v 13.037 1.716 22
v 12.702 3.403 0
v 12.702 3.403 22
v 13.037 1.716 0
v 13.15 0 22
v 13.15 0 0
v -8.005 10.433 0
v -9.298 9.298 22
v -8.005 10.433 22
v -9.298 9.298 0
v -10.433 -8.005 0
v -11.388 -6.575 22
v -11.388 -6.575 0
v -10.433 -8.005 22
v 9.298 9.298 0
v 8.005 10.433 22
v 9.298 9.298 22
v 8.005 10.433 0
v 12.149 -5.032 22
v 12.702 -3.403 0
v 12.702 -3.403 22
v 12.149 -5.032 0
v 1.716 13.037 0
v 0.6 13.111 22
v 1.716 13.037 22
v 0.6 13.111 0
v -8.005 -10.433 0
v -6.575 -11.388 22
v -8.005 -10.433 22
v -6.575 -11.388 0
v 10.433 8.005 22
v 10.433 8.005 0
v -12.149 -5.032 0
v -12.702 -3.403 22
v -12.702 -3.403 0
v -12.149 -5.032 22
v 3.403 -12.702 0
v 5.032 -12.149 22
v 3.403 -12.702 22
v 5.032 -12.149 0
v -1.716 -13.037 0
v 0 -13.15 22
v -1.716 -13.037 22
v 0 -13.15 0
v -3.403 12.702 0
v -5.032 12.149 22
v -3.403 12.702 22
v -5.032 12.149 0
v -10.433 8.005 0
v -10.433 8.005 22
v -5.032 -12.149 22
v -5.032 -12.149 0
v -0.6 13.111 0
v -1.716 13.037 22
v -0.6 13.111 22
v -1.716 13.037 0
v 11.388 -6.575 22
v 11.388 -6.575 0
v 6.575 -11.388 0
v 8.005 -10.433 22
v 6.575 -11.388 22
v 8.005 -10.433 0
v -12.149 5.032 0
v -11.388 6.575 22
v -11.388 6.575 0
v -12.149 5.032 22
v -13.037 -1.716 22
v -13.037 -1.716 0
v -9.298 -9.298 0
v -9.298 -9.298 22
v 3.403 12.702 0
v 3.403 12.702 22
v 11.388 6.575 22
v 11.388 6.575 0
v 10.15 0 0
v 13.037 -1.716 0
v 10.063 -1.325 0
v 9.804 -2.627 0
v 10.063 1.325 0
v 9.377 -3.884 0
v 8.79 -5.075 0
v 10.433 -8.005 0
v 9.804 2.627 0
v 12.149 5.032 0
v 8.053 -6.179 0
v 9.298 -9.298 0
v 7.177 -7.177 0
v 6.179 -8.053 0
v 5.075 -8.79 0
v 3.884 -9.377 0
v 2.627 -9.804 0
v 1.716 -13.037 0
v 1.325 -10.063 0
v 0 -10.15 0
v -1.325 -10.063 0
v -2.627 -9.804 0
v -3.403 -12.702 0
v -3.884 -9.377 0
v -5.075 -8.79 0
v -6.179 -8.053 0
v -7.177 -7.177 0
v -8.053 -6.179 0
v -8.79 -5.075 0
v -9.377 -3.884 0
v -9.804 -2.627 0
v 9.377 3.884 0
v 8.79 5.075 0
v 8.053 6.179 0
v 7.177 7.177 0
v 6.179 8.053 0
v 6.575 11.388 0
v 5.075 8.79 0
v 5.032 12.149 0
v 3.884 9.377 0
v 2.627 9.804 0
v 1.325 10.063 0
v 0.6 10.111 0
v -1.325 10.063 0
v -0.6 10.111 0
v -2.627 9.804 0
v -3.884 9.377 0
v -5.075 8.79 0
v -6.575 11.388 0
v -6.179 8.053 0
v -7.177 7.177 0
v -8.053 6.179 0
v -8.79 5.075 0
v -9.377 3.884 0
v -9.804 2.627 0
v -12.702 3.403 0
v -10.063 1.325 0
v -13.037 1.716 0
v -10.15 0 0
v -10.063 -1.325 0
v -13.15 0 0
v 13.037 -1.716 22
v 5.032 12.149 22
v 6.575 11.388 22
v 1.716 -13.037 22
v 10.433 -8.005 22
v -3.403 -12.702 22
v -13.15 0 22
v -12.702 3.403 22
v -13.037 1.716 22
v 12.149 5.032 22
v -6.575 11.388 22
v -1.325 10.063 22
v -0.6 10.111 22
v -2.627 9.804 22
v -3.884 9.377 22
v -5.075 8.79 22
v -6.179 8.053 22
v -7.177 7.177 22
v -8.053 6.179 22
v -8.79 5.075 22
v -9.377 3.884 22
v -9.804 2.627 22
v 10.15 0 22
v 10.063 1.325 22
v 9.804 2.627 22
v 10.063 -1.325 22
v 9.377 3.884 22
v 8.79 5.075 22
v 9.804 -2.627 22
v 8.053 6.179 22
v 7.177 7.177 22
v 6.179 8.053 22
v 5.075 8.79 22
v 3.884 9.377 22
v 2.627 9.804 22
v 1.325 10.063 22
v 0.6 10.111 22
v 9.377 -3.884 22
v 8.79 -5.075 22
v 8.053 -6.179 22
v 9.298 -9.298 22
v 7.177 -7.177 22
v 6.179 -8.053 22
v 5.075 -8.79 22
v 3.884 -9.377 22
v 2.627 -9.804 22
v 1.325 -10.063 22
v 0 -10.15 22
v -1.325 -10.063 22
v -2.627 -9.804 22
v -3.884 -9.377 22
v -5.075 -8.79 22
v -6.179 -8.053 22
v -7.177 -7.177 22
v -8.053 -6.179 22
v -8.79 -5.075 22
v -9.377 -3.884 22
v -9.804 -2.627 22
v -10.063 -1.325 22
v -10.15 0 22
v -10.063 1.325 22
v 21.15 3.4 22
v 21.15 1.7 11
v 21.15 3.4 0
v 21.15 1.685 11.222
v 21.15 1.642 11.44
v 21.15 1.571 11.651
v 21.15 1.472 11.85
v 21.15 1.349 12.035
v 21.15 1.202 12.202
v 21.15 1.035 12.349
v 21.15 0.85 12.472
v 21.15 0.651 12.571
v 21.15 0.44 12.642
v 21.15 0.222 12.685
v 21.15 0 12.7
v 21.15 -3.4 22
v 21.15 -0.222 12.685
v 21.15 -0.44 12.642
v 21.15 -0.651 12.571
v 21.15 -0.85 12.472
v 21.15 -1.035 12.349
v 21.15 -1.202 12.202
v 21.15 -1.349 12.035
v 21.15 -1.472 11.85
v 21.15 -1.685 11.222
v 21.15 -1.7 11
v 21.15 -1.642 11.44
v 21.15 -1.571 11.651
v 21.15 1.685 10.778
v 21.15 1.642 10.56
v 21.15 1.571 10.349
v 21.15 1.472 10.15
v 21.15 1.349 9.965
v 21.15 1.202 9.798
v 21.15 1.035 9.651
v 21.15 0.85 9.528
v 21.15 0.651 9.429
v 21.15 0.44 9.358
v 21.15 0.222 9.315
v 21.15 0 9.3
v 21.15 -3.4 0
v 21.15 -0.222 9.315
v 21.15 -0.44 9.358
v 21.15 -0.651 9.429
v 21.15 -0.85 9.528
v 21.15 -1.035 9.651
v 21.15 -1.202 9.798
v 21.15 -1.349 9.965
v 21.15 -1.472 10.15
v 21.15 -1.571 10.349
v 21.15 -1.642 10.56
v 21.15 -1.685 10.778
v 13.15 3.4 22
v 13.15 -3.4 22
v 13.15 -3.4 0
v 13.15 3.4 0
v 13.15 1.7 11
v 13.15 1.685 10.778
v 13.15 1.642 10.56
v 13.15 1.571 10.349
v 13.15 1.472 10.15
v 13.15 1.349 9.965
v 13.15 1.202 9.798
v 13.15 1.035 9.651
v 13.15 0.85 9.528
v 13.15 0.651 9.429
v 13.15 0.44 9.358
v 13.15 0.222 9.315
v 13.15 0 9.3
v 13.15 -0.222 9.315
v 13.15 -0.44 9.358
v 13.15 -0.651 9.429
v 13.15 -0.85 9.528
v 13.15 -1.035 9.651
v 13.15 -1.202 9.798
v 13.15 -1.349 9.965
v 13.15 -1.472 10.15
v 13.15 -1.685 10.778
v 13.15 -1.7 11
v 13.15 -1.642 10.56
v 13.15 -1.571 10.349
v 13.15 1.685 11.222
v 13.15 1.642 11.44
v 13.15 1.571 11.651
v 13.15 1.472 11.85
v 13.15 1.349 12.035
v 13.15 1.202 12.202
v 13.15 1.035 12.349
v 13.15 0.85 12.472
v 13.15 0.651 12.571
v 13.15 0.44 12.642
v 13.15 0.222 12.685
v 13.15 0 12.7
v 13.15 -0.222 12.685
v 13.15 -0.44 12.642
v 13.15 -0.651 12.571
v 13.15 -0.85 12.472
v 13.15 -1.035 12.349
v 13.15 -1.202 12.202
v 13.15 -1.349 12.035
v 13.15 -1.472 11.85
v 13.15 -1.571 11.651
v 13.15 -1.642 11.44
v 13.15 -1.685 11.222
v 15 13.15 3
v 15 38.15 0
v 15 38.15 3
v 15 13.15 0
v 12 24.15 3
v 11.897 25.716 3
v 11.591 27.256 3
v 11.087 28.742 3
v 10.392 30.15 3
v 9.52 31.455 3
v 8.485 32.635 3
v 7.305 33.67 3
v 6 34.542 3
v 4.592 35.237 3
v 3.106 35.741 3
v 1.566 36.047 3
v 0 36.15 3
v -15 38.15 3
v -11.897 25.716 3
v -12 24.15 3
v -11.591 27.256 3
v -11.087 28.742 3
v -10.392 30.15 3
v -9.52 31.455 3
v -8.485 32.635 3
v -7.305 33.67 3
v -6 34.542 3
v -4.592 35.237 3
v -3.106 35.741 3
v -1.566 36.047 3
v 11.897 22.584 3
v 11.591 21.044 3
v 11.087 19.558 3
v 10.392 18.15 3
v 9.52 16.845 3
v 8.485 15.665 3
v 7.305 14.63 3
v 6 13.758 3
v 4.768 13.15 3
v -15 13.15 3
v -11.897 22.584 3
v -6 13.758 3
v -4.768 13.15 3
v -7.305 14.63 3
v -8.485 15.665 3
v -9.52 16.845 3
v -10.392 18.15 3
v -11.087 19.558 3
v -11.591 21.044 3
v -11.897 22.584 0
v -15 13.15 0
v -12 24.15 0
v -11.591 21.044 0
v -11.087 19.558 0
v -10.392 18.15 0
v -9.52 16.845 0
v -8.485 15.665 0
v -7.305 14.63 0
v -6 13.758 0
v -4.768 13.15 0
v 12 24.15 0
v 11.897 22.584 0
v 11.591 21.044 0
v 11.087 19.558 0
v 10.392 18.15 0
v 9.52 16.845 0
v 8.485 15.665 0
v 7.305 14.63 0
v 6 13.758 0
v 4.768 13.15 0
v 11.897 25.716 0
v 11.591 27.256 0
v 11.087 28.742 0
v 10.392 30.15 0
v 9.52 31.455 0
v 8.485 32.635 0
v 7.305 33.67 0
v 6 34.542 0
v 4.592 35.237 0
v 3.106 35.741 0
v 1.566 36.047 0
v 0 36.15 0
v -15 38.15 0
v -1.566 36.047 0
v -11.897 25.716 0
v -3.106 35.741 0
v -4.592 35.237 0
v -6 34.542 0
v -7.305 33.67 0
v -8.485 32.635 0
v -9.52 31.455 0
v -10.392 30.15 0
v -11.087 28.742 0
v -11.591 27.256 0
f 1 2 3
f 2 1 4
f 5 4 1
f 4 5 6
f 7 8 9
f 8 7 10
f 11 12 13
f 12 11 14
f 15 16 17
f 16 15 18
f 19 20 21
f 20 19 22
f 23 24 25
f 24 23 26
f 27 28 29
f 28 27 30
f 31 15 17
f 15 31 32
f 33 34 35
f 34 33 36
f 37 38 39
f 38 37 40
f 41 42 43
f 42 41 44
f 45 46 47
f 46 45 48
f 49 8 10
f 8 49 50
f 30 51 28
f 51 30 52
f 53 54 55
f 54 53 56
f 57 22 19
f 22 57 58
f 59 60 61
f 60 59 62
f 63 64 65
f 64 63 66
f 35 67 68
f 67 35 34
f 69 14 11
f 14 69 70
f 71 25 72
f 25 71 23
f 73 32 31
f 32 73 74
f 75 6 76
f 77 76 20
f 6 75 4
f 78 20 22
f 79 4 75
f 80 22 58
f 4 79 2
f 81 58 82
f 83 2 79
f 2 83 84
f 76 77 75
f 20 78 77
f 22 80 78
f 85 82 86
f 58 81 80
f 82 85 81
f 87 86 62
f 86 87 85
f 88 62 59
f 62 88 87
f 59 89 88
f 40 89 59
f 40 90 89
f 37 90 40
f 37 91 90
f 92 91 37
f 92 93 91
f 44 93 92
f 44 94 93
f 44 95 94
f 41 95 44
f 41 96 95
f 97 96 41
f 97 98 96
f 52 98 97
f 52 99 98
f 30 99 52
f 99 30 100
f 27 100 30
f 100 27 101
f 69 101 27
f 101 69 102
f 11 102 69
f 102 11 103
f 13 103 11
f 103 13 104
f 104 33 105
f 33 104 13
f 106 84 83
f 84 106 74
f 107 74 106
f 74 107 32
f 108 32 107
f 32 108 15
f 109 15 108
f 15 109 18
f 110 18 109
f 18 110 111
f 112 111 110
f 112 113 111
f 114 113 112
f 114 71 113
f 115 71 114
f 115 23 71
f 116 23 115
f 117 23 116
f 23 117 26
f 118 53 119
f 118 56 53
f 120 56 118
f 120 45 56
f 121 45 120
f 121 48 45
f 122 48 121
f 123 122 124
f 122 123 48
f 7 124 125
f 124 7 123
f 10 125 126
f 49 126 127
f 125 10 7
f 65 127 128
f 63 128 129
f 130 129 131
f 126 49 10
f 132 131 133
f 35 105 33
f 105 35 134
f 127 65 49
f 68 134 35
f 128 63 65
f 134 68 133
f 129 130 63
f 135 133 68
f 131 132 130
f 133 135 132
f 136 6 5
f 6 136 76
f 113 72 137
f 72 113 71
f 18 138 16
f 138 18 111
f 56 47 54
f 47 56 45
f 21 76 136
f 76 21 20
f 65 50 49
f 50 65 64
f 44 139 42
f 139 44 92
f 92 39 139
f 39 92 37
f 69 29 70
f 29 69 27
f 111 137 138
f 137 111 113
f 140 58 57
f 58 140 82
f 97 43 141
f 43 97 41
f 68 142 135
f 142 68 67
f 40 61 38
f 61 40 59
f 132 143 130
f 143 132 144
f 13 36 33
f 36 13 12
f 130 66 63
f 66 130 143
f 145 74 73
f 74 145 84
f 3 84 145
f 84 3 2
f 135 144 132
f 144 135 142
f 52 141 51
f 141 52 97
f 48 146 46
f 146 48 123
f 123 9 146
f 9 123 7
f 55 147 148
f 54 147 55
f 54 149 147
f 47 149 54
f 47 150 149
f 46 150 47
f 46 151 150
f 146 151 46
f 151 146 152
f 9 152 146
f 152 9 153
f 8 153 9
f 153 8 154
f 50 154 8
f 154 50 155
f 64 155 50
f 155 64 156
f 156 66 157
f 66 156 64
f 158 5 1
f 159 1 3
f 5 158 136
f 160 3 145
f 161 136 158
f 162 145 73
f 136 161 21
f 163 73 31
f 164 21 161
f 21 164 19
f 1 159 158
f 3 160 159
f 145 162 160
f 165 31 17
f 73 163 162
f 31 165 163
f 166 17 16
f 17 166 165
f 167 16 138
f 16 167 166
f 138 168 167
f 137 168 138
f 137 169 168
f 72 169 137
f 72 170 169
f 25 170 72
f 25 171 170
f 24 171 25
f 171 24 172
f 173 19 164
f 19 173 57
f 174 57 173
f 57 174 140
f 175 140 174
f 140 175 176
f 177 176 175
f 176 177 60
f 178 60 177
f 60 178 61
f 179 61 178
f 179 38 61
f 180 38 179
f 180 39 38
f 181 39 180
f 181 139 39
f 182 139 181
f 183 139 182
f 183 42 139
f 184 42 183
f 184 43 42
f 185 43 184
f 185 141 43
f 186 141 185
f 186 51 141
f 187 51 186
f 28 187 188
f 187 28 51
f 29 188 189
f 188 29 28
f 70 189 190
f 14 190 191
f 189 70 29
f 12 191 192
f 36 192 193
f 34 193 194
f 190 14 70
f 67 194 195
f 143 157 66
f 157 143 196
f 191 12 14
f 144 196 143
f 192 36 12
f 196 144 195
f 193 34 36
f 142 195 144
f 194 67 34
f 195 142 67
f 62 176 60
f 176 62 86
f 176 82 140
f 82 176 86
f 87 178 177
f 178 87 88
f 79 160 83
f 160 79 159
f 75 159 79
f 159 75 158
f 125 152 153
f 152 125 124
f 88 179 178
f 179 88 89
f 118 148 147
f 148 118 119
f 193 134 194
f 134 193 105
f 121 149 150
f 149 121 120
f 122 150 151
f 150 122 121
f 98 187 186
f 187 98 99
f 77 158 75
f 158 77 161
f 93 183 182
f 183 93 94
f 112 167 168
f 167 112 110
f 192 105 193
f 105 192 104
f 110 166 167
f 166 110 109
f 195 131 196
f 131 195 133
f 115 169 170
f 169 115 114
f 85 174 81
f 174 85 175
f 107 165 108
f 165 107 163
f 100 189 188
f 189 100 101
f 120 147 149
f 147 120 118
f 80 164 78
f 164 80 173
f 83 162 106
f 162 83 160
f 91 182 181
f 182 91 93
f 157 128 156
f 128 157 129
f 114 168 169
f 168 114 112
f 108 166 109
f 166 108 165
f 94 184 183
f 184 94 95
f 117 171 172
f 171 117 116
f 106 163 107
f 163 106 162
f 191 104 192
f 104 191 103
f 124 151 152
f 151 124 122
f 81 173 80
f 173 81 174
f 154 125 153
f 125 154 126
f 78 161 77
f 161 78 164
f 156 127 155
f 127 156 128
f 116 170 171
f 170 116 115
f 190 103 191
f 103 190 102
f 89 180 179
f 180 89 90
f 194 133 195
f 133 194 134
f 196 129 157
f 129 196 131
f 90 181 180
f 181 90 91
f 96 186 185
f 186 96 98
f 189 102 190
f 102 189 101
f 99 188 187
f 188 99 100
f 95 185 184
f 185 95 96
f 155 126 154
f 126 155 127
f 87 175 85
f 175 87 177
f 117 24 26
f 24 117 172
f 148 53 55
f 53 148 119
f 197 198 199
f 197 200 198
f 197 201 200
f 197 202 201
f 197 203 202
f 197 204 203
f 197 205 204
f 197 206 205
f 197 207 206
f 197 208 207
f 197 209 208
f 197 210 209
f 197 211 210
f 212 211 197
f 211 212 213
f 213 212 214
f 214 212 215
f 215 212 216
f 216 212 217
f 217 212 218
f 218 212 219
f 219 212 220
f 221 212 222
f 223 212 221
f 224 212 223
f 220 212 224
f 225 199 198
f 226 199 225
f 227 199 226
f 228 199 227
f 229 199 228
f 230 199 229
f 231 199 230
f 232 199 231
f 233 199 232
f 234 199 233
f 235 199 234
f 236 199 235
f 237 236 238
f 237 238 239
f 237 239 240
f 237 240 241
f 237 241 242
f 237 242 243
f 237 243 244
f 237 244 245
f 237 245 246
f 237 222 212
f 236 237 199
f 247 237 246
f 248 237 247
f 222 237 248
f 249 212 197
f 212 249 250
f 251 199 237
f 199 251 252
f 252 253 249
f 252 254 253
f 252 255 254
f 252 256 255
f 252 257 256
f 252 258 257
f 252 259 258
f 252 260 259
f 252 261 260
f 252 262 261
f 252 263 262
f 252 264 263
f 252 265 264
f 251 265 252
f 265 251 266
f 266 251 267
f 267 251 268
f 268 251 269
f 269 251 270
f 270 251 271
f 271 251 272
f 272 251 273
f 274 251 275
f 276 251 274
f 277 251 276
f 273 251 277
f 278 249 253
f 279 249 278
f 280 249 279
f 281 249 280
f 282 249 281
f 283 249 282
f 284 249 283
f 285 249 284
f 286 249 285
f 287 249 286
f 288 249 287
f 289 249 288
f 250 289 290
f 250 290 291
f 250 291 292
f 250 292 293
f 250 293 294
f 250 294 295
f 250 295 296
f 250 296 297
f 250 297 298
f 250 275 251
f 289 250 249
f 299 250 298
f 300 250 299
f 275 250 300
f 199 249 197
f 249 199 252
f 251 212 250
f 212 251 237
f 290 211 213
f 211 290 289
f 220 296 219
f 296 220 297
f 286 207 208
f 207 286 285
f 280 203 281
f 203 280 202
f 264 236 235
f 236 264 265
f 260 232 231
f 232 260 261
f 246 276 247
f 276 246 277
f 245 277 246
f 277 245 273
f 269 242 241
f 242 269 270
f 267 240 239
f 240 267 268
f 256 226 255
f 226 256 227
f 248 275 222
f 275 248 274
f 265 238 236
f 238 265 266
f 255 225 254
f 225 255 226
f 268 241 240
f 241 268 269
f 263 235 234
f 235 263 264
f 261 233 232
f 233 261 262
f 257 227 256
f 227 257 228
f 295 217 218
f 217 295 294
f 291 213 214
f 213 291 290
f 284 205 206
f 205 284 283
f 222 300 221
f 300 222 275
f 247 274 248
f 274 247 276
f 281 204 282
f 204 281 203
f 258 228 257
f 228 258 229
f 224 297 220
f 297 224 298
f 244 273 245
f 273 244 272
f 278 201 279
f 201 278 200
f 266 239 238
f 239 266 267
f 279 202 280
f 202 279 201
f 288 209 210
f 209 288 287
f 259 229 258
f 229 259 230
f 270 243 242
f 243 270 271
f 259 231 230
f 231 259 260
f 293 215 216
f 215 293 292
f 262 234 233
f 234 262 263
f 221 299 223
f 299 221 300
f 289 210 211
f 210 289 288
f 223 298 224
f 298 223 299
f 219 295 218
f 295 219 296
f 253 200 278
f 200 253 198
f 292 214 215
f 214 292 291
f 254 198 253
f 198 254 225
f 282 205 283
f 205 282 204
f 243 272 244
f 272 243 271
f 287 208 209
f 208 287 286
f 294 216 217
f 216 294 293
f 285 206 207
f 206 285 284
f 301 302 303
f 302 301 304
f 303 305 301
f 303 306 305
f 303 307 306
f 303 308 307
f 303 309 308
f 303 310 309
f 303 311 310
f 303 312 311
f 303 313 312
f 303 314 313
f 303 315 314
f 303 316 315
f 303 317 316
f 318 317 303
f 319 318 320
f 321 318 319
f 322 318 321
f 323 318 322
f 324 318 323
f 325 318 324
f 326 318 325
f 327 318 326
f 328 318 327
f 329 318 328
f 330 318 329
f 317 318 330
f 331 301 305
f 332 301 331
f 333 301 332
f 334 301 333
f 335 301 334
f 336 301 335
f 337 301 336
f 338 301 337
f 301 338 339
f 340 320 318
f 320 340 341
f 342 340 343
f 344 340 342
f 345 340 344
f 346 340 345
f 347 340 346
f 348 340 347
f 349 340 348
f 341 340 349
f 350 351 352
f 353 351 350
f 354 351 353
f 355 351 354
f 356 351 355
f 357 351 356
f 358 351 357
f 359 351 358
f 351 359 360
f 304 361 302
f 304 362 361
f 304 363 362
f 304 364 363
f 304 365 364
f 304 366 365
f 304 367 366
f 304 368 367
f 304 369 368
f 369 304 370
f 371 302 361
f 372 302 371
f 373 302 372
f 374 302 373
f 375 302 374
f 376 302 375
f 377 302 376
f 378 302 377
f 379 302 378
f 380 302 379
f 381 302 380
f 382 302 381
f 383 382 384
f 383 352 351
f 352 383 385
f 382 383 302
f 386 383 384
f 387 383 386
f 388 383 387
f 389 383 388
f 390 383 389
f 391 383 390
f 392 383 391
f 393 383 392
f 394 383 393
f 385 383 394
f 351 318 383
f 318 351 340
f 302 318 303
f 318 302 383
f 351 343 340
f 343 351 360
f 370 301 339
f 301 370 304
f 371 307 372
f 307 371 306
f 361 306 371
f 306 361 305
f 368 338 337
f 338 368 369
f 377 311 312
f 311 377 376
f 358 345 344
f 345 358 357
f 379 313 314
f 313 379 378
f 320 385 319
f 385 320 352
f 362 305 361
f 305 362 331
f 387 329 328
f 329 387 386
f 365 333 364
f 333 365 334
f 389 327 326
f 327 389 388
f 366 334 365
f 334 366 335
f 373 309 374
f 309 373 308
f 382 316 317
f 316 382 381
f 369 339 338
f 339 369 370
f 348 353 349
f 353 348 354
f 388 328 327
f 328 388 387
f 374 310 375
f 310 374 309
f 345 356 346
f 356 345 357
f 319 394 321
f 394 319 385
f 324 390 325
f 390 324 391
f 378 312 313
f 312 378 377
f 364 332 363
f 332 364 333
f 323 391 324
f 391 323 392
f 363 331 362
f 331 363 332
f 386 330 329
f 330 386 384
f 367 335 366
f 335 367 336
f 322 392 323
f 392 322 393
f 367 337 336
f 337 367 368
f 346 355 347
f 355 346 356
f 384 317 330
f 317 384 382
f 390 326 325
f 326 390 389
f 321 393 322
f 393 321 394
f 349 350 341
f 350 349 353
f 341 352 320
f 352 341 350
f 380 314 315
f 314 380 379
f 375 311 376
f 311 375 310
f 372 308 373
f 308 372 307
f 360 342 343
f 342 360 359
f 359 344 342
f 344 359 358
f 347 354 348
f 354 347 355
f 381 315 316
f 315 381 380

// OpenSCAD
// ============================================================
// Arm Connector Bracket — PVC pipe to servo horn
// ============================================================
// Generic bracket connecting a 20 mm PVC arm segment to a
// standard servo horn (cross/disc horn, 4-arm style).
//
// Used at both shoulder (MG996R) and elbow (MG90S) joints.
// The horn side has a circular recess; the PVC side has a
// split collar clamp (tighten with one M3 bolt).
// ============================================================

pvc_od      = 20;    // mm — PVC outer diameter
pvc_tol     =  0.3;  // mm — diametric clearance
collar_len  = 22;    // mm — clamp length along pipe axis
collar_wall =  3;    // mm — wall around pipe
clamp_gap   =  1.2;  // mm — slot width for tightening

horn_recess_d   = 24;  // mm — servo horn boss outer diameter
horn_recess_h   =  4;  // mm — recess depth
horn_centre_d   =  5;  // mm — servo shaft spline boss
horn_bolt_d     =  2.1;// mm — M2 horn bolt clearance
horn_bolt_r     =  9;  // mm — bolt circle radius
horn_arms       =  4;  // number of horn arms

plate_w   = 30;   // mm — bridge plate width
plate_h   = 25;   // mm — bridge plate height (collar to horn)
plate_t   =  3;   // mm — plate thickness
screw_d   =  3.4; // mm — M3 clamp bolt

$fn = 48;
pvc_r    = (pvc_od + pvc_tol) / 2;
col_r    = pvc_r + collar_wall;

// ============================================================
module collar() {
    difference() {
        cylinder(r = col_r, h = collar_len);
        // PVC bore
        cylinder(r = pvc_r, h = collar_len + 1);
        // Clamp slot (radial)
        translate([-clamp_gap/2, col_r - collar_wall - 1, -0.1])
            cube([clamp_gap, collar_wall + 2, collar_len + 0.2]);
    }
    // Clamp ear
    translate([col_r, -(screw_d*2)/2, 0])
        difference() {
            cube([8, screw_d * 2, collar_len]);
            translate([4, screw_d, collar_len/2])
                rotate([0, 90, 0])
                    cylinder(r = screw_d/2, h = 9, center = true);
        }
}

module horn_plate() {
    // Bridge plate centred, with horn recess on one face
    translate([-plate_w/2, col_r, 0])
        difference() {
            cube([plate_w, plate_h, plate_t]);
            // Horn recess (circular, from top face)
            translate([plate_w/2, plate_h - horn_recess_d/2 - 2,
                        plate_t - horn_recess_h + 0.1])
                cylinder(r = horn_recess_d/2, h = horn_recess_h + 0.1);
            // Horn centre spline boss hole
            translate([plate_w/2, plate_h - horn_recess_d/2 - 2, -0.1])
                cylinder(r = horn_centre_d/2, h = plate_t + 0.2);
            // Horn bolt holes
            for (i = [0 : horn_arms - 1]) {
                rotate([0, 0, i * 360/horn_arms])
                    translate([plate_w/2 + horn_bolt_r,
                               plate_h - horn_recess_d/2 - 2,
                               -0.1])
                        cylinder(r = horn_bolt_d/2, h = plate_t + 0.2);
            }
        }
}

// ============================================================
union() {
    color("LightSlateGray") collar();
    color("SlateGray")      horn_plate();
}
